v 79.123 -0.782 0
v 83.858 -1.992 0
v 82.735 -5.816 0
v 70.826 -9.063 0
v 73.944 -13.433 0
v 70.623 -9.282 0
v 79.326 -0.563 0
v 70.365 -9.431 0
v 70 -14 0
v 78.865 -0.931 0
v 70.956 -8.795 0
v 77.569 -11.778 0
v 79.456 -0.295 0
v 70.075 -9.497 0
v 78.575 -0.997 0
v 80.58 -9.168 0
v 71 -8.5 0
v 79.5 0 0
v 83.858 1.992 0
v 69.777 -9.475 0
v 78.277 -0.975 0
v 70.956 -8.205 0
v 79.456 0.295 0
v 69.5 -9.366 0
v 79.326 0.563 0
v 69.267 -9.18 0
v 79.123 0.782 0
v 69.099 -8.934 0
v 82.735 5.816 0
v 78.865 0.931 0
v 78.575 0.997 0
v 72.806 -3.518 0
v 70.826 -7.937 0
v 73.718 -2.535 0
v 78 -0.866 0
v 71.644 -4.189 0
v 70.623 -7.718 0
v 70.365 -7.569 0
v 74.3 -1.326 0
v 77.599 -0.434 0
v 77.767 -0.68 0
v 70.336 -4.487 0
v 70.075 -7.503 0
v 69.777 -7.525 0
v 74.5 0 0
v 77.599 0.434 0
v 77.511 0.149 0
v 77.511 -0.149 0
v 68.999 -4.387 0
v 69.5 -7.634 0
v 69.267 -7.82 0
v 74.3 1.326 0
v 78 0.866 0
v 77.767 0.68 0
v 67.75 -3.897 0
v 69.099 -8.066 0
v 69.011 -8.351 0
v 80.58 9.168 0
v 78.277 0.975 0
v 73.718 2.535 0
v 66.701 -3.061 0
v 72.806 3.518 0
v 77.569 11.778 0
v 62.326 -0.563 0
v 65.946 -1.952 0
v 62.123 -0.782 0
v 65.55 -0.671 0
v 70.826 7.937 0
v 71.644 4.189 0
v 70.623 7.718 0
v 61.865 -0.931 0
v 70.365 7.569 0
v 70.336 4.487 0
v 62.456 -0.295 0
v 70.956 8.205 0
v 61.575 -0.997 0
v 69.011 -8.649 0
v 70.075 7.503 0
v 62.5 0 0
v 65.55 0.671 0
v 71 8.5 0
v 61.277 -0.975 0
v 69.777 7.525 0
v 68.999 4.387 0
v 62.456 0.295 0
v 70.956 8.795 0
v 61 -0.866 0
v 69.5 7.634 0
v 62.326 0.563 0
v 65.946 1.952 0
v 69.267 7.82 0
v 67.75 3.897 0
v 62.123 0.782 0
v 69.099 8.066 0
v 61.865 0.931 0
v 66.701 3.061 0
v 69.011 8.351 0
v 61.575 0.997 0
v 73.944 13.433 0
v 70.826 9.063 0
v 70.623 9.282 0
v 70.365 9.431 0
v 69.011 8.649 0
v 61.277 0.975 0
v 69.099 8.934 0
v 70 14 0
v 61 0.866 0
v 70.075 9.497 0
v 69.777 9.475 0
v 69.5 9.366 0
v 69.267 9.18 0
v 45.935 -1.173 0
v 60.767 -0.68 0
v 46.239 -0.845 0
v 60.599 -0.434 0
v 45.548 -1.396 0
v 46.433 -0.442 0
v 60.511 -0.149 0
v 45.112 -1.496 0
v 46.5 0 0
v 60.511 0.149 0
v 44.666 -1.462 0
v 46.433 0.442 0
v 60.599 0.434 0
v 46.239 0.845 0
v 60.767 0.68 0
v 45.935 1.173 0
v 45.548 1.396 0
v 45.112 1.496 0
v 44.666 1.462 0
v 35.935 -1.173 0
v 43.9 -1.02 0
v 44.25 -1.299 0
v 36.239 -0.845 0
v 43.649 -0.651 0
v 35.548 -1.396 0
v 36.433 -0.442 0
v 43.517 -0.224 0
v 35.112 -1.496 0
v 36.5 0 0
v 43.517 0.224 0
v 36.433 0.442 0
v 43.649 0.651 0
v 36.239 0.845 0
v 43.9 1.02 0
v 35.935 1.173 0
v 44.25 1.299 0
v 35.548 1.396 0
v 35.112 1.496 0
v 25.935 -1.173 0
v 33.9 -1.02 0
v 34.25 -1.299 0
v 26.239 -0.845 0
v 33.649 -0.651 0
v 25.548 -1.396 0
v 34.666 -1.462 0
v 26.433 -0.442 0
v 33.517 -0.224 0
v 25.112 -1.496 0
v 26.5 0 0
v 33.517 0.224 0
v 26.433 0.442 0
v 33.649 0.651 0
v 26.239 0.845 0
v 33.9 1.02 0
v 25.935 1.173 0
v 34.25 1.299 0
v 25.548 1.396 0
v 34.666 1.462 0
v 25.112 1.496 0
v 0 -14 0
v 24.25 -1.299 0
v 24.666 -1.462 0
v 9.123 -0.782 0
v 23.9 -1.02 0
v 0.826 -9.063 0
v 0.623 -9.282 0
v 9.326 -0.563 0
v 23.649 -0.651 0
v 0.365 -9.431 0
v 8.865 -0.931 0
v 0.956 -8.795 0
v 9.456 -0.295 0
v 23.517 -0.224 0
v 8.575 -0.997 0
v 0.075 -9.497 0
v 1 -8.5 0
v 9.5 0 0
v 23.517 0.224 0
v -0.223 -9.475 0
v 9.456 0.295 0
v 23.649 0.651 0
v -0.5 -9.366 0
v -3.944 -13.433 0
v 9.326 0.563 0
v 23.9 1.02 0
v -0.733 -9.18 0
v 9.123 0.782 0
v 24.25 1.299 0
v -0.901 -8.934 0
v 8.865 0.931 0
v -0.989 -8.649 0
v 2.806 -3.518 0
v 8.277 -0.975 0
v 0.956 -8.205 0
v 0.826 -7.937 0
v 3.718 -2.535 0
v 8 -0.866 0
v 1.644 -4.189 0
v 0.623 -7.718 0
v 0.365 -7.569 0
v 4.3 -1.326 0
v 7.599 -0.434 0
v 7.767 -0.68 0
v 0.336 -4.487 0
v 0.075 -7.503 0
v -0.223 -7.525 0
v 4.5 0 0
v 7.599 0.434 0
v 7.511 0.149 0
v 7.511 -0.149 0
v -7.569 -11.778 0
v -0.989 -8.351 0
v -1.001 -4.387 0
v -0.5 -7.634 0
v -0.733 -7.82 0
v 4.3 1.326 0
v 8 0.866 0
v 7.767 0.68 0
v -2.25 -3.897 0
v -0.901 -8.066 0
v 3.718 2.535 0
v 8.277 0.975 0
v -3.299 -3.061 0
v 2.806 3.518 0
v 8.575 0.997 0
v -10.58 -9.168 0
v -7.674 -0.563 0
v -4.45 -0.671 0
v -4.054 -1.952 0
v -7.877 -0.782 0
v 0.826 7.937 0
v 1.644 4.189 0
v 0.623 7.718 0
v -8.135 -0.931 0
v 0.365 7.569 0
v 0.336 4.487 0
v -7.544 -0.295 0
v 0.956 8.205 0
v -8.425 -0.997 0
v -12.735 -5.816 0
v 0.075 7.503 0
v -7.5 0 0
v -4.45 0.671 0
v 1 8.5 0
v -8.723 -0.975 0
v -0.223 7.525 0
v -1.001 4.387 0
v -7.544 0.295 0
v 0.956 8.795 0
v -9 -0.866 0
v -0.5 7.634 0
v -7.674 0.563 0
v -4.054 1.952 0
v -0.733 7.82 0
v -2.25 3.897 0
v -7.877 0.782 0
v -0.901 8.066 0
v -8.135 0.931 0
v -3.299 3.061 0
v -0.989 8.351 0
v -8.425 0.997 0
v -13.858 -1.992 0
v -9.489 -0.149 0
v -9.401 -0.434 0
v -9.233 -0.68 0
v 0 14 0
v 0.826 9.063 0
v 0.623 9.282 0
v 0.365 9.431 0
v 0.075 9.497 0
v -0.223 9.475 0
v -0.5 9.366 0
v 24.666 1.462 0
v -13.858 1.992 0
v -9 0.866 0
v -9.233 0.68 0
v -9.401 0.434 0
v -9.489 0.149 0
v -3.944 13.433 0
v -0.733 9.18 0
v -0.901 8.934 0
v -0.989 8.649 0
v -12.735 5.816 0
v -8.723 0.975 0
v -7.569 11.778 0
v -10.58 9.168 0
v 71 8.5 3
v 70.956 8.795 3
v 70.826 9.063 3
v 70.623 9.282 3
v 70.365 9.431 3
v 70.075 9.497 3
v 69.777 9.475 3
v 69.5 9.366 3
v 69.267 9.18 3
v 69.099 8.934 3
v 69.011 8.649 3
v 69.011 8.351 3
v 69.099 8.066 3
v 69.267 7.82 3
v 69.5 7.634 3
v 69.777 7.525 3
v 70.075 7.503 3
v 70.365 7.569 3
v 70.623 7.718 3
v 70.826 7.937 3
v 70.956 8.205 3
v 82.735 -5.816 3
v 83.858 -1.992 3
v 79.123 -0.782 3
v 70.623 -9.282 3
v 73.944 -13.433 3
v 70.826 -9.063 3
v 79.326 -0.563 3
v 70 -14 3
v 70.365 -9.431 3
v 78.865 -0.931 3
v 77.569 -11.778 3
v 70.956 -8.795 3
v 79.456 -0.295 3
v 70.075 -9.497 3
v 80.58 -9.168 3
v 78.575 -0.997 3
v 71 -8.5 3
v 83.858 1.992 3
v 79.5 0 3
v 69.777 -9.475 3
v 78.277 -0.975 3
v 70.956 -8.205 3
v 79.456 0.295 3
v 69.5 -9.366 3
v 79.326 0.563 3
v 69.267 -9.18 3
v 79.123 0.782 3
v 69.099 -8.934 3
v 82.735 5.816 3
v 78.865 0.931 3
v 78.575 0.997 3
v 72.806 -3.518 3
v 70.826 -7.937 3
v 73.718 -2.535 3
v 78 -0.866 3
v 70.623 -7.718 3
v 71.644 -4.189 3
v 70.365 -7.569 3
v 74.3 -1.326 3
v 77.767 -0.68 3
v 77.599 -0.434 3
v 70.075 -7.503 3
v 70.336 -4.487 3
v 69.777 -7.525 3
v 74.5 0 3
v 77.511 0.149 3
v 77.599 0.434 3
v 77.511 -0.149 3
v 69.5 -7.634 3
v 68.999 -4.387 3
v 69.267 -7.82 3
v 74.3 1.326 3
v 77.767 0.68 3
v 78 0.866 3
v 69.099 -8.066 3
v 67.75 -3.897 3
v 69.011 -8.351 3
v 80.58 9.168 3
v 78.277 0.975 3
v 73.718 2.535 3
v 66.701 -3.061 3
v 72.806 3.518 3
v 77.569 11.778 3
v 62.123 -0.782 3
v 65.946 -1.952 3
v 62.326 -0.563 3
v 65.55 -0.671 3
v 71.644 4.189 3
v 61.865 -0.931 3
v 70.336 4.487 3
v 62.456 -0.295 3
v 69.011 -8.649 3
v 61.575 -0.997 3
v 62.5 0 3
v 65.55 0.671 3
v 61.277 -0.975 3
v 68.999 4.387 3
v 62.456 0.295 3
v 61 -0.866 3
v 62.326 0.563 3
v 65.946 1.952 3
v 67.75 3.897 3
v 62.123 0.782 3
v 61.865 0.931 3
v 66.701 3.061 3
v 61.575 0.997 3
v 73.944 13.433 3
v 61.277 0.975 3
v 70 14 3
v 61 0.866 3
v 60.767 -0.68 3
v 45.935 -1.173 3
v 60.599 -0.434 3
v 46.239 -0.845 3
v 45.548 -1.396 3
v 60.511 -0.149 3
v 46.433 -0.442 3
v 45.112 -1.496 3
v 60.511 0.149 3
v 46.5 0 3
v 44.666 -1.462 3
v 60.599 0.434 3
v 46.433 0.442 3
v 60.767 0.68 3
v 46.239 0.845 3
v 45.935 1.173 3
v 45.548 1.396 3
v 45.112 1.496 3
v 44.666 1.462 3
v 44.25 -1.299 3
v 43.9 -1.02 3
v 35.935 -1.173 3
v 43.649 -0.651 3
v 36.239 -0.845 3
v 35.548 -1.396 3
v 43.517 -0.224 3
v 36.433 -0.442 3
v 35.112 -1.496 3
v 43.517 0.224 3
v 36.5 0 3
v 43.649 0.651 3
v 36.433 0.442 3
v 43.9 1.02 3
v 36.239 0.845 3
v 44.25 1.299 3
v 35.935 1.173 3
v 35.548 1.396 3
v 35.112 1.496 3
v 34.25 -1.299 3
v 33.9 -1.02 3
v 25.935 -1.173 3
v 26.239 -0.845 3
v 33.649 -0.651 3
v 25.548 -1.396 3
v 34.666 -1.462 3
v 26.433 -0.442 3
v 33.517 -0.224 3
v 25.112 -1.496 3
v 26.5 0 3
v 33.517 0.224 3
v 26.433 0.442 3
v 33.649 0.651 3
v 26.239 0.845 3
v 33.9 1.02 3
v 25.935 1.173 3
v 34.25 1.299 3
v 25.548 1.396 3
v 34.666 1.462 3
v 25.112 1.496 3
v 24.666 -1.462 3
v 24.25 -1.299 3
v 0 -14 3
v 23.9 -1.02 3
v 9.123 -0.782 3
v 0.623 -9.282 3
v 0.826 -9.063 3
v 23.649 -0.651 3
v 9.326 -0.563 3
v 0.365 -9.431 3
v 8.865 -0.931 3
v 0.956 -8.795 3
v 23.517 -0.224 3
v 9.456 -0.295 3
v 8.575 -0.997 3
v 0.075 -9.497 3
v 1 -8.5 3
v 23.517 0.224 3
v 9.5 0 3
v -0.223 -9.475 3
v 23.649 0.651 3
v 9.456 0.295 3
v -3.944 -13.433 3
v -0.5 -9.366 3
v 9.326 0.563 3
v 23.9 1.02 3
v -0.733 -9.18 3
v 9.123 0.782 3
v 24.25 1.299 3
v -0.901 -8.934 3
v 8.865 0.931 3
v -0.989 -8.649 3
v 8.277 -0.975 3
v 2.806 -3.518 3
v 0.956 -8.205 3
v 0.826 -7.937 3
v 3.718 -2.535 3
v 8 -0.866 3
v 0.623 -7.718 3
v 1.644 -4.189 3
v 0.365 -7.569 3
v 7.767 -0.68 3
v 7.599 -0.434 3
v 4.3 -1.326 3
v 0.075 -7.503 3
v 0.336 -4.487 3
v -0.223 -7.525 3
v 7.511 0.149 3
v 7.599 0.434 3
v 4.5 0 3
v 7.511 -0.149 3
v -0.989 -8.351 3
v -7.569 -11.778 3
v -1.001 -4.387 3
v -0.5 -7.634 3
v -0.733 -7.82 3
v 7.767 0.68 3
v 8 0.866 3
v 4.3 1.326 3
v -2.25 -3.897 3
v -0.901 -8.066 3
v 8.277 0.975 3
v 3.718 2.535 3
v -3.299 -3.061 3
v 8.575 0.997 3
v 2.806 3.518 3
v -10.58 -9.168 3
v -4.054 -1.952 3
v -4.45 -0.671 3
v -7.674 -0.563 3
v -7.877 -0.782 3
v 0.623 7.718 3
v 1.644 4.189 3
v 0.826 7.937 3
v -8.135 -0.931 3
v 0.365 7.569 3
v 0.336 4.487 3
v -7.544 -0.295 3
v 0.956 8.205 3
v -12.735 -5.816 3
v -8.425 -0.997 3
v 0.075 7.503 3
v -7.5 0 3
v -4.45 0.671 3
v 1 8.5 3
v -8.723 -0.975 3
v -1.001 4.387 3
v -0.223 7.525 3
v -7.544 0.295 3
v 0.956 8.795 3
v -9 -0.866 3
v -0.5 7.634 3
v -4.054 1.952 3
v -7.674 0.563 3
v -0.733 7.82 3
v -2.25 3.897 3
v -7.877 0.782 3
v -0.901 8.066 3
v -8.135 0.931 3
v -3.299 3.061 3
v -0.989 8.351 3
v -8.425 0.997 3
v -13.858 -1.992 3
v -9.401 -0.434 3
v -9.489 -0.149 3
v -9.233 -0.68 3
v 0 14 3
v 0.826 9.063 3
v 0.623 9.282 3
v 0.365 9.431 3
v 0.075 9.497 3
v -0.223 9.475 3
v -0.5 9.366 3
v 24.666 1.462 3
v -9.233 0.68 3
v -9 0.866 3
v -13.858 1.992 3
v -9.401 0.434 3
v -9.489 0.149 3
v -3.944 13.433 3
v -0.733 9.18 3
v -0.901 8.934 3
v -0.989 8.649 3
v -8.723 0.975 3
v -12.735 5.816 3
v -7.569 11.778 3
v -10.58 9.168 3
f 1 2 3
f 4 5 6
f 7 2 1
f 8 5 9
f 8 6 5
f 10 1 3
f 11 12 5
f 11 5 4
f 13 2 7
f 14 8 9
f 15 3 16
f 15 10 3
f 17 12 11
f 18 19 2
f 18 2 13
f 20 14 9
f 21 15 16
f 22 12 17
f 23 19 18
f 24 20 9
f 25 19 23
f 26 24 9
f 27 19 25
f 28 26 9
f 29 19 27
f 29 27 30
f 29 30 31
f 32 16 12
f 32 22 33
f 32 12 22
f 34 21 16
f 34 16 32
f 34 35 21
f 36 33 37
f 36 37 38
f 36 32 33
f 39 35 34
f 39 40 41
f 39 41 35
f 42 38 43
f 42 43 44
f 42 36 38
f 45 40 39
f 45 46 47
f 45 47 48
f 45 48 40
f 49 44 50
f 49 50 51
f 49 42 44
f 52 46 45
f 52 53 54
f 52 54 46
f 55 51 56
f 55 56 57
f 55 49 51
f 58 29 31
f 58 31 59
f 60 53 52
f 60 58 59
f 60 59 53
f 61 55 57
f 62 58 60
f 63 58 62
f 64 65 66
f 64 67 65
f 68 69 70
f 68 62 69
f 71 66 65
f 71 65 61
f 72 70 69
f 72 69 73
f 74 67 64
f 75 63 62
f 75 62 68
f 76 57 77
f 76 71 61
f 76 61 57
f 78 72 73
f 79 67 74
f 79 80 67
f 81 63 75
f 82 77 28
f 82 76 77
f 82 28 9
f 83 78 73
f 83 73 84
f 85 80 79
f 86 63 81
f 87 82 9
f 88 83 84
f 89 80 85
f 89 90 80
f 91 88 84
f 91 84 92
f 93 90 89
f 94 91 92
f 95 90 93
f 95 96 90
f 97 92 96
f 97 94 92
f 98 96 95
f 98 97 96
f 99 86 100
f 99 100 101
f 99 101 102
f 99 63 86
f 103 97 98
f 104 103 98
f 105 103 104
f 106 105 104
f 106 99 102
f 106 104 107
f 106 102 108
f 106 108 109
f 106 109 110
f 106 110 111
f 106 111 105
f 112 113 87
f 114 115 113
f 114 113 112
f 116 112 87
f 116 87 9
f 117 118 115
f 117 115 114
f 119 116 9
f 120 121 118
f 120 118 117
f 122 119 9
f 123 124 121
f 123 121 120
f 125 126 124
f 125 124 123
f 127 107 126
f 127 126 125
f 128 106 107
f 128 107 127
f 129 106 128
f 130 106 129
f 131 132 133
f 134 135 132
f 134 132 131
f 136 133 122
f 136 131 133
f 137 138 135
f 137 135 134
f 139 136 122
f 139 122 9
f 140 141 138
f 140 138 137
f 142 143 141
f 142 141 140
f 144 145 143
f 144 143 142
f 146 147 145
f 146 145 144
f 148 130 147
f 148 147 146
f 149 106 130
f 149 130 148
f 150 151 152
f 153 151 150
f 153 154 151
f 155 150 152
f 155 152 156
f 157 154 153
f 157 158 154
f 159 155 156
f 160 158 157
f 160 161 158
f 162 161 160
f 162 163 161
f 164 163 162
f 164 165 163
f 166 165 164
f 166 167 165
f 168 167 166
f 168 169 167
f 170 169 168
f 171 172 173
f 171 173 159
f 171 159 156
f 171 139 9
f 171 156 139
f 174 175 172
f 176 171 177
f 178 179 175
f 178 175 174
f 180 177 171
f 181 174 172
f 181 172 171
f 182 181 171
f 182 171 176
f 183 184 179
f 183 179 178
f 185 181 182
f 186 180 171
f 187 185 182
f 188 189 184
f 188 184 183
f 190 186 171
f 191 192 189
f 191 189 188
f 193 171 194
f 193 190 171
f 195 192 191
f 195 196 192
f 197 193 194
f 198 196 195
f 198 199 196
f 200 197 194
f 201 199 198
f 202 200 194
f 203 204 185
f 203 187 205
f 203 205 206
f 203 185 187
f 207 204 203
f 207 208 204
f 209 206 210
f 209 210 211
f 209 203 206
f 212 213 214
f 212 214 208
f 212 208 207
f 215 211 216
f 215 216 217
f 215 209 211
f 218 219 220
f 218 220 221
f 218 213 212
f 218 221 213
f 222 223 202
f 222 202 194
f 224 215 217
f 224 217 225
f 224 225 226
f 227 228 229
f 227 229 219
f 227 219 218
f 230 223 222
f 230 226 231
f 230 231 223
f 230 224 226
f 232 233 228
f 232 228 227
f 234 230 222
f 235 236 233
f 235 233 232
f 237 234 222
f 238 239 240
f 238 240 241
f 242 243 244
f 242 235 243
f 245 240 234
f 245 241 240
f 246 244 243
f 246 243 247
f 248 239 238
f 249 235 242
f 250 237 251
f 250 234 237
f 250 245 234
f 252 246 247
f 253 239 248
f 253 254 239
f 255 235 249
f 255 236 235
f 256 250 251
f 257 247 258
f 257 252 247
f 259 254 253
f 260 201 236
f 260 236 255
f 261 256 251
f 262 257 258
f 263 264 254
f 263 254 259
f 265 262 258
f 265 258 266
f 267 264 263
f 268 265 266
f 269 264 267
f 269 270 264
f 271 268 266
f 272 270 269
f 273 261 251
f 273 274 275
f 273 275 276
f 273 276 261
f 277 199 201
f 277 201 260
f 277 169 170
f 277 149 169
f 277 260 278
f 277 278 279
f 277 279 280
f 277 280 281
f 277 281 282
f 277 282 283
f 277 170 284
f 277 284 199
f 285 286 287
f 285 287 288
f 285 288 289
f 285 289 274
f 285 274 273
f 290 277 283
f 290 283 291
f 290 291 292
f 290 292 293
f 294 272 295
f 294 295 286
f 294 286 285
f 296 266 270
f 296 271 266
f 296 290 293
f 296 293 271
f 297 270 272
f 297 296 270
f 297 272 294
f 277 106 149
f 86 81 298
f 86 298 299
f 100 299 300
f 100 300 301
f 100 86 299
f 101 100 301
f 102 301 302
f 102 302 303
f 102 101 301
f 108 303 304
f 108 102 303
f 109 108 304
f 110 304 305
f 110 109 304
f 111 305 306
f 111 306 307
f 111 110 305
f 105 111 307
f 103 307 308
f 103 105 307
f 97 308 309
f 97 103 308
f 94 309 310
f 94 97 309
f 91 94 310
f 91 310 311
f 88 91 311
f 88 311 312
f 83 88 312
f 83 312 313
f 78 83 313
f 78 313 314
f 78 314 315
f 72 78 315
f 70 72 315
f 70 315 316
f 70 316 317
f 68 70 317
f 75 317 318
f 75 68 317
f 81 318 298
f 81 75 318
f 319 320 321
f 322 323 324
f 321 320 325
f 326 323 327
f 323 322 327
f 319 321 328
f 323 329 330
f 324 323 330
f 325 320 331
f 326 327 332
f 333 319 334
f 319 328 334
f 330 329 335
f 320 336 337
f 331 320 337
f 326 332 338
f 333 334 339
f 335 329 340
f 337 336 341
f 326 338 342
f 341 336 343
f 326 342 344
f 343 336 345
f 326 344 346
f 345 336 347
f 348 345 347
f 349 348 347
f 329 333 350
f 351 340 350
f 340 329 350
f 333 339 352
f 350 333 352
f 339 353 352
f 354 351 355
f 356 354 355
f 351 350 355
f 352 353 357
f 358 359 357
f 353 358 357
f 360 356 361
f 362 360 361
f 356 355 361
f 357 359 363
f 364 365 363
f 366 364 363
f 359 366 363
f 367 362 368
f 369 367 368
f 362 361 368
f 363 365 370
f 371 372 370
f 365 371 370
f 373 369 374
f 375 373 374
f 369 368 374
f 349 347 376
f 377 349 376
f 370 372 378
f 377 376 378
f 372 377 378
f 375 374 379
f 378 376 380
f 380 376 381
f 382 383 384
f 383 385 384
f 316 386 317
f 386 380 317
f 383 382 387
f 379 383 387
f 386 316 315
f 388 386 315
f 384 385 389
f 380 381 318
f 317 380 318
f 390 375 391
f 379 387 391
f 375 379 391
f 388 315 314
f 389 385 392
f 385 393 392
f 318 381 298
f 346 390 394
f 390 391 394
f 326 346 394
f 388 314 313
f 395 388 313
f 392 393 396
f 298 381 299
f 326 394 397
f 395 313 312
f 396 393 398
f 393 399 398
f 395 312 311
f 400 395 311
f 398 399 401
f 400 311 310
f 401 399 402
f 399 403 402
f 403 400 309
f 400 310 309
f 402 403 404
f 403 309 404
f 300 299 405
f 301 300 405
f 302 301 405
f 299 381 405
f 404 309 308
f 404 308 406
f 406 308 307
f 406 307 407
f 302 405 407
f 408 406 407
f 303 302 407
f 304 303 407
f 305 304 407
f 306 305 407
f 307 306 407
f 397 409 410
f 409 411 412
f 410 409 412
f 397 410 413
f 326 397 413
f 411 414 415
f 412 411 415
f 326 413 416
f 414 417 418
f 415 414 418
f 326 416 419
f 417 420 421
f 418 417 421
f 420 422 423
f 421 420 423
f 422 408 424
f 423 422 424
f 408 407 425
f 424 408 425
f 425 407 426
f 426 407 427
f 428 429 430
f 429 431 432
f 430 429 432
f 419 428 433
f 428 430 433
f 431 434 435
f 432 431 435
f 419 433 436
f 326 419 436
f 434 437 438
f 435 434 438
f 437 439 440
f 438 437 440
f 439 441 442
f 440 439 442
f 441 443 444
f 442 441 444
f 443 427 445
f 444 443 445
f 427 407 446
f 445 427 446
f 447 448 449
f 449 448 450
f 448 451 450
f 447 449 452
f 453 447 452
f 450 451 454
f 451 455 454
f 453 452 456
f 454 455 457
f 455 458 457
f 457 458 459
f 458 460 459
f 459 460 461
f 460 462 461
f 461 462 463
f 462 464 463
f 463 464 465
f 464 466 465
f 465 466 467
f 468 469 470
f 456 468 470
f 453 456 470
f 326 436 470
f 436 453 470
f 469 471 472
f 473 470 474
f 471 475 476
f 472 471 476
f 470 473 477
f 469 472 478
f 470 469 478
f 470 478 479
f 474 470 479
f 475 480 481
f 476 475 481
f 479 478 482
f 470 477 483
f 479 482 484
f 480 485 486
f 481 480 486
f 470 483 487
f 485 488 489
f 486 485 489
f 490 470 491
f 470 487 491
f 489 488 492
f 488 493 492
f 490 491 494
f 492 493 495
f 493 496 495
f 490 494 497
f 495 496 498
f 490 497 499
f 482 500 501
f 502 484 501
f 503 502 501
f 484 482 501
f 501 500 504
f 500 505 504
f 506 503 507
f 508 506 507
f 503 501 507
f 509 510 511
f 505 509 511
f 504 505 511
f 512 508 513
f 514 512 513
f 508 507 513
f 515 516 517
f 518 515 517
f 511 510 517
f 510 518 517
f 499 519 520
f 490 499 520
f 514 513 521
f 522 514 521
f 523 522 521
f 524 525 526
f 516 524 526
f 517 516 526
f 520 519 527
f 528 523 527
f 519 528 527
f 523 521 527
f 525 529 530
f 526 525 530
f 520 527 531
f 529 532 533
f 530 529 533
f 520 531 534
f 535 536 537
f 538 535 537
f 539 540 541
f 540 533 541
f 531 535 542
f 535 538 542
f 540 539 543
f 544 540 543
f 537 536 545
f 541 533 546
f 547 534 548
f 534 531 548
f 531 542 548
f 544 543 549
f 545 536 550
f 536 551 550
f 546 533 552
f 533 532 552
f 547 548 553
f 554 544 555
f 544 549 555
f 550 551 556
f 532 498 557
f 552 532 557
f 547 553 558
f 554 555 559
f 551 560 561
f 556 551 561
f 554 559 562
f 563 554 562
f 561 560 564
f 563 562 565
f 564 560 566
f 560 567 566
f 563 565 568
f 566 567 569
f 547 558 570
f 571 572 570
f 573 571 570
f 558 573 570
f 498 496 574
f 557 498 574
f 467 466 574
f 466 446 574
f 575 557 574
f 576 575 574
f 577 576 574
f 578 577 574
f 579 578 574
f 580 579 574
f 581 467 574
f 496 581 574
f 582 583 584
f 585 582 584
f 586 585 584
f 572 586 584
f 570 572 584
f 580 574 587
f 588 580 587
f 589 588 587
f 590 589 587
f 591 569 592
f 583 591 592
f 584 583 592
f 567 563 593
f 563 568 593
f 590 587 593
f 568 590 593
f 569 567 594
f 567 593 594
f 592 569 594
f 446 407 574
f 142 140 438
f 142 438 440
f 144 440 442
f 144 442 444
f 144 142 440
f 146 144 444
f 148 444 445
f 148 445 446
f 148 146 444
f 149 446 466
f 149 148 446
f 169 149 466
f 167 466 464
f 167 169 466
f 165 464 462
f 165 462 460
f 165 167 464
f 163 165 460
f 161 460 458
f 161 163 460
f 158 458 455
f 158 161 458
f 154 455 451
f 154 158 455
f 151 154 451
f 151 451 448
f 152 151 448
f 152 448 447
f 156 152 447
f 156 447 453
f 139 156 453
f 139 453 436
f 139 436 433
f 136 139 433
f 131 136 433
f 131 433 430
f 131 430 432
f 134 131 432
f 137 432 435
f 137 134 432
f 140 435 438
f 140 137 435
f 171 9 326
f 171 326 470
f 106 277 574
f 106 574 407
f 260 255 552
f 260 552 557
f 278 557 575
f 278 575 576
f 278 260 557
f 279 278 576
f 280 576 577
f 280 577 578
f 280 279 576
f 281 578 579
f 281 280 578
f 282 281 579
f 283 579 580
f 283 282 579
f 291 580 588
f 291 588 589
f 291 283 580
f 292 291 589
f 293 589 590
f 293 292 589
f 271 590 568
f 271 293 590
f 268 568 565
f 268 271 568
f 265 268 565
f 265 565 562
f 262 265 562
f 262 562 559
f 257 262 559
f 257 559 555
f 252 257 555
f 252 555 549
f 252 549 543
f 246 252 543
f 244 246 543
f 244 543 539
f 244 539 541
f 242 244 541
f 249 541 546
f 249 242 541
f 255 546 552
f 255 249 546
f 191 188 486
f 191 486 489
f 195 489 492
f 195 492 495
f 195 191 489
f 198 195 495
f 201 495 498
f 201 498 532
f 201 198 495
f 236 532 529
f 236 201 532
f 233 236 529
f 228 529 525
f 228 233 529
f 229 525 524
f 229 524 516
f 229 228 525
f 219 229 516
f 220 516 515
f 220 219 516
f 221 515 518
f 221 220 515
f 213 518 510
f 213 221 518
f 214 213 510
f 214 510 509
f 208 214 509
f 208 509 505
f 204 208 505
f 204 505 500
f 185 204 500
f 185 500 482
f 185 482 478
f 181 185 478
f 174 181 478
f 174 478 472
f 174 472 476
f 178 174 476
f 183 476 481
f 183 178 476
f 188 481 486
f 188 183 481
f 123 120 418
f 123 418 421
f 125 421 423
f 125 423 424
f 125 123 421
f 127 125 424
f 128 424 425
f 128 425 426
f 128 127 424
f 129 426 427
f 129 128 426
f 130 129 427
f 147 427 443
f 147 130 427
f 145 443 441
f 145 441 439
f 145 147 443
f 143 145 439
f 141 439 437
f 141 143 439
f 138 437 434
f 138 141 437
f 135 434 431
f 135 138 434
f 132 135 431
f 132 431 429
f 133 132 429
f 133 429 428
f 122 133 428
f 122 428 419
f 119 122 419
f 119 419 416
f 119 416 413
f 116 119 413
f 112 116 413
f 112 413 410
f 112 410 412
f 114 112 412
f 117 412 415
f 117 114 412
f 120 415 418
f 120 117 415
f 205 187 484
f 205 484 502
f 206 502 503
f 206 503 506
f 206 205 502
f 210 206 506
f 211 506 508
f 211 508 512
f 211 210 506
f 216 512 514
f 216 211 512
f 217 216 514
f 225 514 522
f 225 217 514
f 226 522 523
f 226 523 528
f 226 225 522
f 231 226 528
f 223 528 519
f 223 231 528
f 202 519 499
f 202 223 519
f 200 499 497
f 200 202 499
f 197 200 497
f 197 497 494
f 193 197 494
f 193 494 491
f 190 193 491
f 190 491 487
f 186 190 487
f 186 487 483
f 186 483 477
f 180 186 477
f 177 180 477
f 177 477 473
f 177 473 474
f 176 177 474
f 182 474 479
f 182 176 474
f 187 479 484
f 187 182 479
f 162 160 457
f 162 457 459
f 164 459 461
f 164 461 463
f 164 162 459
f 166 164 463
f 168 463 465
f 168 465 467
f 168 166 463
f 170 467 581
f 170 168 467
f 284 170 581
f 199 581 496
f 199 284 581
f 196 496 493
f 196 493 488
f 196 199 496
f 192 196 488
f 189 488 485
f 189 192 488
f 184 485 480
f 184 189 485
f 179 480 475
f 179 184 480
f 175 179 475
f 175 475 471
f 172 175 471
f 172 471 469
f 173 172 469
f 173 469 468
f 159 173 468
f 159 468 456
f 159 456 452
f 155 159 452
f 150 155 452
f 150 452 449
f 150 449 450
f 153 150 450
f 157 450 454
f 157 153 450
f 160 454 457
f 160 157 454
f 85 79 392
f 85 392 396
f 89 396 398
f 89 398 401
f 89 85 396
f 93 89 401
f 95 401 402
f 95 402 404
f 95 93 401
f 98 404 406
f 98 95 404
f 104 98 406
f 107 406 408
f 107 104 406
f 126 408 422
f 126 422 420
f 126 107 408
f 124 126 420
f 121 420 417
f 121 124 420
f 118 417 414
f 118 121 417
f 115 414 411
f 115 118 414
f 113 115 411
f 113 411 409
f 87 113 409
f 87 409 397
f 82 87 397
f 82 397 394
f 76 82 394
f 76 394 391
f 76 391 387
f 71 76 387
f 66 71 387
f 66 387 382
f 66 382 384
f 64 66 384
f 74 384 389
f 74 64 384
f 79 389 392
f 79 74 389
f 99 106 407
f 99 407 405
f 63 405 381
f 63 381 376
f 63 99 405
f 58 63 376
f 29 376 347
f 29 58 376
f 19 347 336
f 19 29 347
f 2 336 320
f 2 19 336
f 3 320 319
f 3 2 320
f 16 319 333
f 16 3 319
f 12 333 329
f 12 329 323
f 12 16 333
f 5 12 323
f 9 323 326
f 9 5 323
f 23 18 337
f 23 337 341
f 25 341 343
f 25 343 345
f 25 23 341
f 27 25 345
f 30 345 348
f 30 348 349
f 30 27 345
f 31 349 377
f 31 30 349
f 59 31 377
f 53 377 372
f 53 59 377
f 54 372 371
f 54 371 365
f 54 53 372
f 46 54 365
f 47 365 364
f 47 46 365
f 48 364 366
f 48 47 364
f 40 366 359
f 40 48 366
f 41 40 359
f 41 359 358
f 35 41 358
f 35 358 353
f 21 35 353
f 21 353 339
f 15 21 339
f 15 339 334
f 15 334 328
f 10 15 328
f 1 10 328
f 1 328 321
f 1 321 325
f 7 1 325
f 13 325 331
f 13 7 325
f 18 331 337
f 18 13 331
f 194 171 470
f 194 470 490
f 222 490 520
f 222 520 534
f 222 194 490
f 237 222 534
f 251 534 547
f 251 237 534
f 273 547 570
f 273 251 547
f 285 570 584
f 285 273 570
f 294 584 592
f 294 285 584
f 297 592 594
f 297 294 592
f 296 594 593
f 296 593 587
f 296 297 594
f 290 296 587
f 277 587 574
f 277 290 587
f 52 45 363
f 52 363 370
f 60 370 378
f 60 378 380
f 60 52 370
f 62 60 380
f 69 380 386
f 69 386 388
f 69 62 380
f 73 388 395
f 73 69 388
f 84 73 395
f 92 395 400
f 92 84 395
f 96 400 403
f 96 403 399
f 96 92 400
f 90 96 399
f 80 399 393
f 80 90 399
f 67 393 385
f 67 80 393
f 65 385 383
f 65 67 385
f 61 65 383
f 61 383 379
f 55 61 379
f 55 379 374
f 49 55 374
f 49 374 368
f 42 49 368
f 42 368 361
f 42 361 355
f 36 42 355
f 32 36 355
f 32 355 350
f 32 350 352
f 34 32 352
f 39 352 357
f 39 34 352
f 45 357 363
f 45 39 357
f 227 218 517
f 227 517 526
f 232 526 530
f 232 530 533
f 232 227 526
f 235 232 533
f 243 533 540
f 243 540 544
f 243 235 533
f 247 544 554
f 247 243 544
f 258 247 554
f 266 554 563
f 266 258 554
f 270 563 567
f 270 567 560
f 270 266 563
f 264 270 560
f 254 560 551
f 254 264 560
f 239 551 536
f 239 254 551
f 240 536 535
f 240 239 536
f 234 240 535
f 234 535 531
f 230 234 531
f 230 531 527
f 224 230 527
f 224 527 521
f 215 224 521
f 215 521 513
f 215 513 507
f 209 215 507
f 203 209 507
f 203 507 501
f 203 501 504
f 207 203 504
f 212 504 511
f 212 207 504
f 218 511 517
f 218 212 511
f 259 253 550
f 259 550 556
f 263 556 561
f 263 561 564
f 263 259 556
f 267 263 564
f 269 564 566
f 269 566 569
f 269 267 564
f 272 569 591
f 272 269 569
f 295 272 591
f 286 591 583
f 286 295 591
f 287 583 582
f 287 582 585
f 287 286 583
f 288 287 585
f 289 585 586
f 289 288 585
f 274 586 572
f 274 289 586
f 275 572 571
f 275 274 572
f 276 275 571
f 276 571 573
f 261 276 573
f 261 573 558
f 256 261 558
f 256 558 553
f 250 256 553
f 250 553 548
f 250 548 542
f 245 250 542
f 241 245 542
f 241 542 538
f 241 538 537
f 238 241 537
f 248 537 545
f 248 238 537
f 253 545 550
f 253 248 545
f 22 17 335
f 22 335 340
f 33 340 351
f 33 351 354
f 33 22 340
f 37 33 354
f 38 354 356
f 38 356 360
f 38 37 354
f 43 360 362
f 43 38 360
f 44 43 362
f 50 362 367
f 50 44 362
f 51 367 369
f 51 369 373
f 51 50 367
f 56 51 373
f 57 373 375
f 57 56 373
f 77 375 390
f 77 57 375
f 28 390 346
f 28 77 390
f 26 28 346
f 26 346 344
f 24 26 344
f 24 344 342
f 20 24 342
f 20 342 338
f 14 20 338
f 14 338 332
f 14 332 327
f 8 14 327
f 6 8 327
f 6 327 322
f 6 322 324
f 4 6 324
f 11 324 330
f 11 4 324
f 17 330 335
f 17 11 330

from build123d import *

# Parameters (mm, degrees)
SKETCH1_R           = 4.5
SKETCH1_R_2         = 1
SKETCH1_R_3         = 1.5
BOSS_EXTRUDE1_DEPTH = 3


with BuildPart() as part:
    # Sketch1 → Boss-Extrude1 (new body)
    with BuildSketch(Plane.XY):
        with BuildLine():
            Line((0, 14), (70, 14))
            ThreePointArc((70, 14), (84, 0), (70, -14))
            Line((70, -14), (0, -14))
            ThreePointArc((0, -14), (-14, 0), (0, 14))
        make_face()
        Circle(SKETCH1_R, mode=Mode.SUBTRACT)
        with Locations((0, 8.5)):
            Circle(SKETCH1_R_2, mode=Mode.SUBTRACT)
        with Locations((8.5, 0)):
            Circle(SKETCH1_R_2, mode=Mode.SUBTRACT)
        with Locations((0, -8.5)):
            Circle(SKETCH1_R_2, mode=Mode.SUBTRACT)
        with Locations((-8.5, 0)):
            Circle(SKETCH1_R_2, mode=Mode.SUBTRACT)
        with Locations((70, 0)):
            Circle(SKETCH1_R, mode=Mode.SUBTRACT)
        with Locations((70, 8.5)):
            Circle(SKETCH1_R_2, mode=Mode.SUBTRACT)
        with Locations((78.5, 0)):
            Circle(SKETCH1_R_2, mode=Mode.SUBTRACT)
        with Locations((70, -8.5)):
            Circle(SKETCH1_R_2, mode=Mode.SUBTRACT)
        with Locations((61.5, 0)):
            Circle(SKETCH1_R_2, mode=Mode.SUBTRACT)
        with Locations((25, 0)):
            Circle(SKETCH1_R_3, mode=Mode.SUBTRACT)
        with Locations((35, 0)):
            Circle(SKETCH1_R_3, mode=Mode.SUBTRACT)
        with Locations((45, 0)):
            Circle(SKETCH1_R_3, mode=Mode.SUBTRACT)
    extrude(amount=BOSS_EXTRUDE1_DEPTH)


solid = part.part
